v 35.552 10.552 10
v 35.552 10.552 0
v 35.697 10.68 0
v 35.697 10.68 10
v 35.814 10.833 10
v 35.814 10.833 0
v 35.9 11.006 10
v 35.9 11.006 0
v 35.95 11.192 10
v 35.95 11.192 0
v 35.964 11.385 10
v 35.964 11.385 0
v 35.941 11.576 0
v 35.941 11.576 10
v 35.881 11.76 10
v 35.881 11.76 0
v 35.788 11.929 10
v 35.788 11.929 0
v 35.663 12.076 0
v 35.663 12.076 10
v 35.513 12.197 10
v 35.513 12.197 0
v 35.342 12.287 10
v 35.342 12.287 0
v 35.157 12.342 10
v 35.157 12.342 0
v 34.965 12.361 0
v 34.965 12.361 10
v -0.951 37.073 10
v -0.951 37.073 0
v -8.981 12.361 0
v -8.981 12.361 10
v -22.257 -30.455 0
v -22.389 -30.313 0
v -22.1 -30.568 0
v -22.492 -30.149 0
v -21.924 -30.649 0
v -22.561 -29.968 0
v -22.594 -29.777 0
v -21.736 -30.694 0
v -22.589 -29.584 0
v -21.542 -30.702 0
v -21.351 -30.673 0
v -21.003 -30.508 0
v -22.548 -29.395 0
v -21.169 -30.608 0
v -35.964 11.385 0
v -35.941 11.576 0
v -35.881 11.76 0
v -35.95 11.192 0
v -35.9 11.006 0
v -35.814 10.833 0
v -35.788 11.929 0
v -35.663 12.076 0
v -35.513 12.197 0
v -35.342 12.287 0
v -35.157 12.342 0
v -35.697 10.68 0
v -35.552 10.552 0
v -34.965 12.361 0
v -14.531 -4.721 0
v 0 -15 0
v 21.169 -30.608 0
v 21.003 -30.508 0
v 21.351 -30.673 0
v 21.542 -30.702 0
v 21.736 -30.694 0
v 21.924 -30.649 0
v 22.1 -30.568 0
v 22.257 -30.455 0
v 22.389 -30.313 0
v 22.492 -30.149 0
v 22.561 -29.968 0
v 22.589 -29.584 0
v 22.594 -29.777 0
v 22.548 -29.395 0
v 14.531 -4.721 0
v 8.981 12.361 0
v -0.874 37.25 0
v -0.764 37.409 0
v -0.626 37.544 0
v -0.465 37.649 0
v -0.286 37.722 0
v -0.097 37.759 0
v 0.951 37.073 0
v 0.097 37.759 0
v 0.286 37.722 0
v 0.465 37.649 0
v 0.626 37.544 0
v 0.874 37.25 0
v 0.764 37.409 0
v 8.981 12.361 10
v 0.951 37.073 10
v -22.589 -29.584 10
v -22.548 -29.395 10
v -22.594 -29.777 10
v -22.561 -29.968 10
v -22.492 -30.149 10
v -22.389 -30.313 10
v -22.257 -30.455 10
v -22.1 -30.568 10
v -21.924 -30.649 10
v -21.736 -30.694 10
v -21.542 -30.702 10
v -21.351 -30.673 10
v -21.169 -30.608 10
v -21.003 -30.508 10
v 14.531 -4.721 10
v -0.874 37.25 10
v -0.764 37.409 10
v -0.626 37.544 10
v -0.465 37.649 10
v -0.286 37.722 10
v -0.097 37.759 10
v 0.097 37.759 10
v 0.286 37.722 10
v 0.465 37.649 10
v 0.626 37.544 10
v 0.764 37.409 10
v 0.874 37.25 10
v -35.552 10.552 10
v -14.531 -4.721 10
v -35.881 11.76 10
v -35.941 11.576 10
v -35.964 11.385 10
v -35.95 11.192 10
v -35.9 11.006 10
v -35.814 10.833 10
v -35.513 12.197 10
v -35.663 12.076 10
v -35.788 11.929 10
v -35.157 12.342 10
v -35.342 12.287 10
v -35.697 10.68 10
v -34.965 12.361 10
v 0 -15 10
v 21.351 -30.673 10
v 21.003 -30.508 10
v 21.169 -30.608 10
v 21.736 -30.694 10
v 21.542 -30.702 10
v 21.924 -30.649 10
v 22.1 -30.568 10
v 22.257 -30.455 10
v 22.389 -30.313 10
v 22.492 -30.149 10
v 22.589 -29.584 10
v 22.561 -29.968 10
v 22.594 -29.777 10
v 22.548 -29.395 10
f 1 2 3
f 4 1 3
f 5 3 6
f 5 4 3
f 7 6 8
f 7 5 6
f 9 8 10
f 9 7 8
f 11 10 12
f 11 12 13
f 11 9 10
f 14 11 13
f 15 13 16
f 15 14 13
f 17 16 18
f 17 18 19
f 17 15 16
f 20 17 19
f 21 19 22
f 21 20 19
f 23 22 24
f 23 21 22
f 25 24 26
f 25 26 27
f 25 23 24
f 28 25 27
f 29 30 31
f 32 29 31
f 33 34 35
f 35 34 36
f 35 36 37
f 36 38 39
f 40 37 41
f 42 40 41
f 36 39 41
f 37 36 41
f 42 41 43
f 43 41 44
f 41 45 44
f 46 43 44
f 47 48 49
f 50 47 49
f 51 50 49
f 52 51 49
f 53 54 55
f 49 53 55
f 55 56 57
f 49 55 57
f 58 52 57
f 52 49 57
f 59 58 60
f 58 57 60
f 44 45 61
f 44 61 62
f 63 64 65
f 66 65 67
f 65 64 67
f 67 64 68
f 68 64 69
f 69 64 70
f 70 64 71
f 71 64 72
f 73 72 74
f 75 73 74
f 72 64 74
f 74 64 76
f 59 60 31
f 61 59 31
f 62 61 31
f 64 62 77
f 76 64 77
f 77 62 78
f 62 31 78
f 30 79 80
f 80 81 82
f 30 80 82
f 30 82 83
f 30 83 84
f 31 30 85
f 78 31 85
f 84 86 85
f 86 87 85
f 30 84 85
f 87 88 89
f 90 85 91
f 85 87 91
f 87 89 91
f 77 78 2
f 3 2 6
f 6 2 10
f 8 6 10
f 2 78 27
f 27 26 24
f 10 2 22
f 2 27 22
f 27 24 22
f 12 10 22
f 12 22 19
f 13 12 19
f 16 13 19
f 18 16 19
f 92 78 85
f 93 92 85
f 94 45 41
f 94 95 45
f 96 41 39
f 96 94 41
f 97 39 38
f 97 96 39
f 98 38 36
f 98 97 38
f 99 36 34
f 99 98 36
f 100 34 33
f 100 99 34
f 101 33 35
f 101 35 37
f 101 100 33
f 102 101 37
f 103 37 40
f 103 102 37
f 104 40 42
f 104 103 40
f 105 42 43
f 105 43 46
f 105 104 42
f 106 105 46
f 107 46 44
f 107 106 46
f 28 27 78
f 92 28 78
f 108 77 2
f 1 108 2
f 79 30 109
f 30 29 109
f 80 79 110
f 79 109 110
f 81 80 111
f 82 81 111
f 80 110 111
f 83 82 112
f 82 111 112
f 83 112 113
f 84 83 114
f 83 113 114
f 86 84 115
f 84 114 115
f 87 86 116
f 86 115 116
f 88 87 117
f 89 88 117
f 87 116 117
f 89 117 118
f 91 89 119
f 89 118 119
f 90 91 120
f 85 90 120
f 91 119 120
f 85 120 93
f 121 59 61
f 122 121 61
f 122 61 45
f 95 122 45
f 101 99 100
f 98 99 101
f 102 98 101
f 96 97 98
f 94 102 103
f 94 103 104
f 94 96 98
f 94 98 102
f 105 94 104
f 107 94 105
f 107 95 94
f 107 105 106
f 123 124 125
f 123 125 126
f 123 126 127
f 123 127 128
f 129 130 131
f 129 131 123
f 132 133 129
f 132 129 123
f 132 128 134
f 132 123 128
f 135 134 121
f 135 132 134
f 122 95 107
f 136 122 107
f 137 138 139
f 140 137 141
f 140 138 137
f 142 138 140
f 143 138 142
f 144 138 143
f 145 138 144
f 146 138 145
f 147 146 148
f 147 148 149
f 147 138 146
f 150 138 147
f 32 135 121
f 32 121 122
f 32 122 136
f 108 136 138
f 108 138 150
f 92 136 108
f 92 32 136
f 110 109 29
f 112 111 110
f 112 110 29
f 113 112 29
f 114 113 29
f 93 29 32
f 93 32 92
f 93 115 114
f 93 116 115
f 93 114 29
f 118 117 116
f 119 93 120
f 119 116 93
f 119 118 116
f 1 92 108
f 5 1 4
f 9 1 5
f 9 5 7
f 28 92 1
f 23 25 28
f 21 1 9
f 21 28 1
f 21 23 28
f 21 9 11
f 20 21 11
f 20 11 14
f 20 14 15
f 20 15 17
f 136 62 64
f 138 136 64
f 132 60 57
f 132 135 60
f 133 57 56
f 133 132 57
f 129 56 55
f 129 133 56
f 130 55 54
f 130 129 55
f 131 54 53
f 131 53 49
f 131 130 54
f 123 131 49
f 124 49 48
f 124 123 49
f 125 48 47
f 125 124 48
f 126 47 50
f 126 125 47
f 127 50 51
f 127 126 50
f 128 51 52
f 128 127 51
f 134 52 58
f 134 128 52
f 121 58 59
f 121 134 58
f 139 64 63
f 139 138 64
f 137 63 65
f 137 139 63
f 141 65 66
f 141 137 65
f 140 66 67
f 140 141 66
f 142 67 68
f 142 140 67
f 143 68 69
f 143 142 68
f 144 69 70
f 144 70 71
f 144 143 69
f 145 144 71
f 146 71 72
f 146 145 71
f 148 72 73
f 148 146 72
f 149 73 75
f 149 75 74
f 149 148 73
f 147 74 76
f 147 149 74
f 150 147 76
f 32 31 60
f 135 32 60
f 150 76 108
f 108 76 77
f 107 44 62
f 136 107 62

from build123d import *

# Parameters (mm, degrees)
PAD_DEPTH = 10
FILLET_R  = 1


with BuildPart() as part:
    # Sketch → Pad (new body)
    with BuildSketch(Plane.XY):
        Polygon((0, 40), (-8.98056, 12.36068), (-38.042261, 12.36068), (-14.530851, -4.72136), (-23.51141, -32.36068), (0, -15), (23.51141, -32.36068), (14.530851, -4.72136), (38.042261, 12.36068), (8.98056, 12.36068), align=None)
    extrude(amount=PAD_DEPTH)

    # Fillet
    fillet_edges = [part.edges().sort_by_distance(p)[0] for p in [
        (38.042261, 12.36068, 5),
        (0, 40, 5),
        (-38.042261, 12.36068, 5),
        (-23.51141, -32.36068, 5),
        (23.51141, -32.36068, 5),
    ]]
    fillet(fillet_edges, radius=FILLET_R)


solid = part.part
